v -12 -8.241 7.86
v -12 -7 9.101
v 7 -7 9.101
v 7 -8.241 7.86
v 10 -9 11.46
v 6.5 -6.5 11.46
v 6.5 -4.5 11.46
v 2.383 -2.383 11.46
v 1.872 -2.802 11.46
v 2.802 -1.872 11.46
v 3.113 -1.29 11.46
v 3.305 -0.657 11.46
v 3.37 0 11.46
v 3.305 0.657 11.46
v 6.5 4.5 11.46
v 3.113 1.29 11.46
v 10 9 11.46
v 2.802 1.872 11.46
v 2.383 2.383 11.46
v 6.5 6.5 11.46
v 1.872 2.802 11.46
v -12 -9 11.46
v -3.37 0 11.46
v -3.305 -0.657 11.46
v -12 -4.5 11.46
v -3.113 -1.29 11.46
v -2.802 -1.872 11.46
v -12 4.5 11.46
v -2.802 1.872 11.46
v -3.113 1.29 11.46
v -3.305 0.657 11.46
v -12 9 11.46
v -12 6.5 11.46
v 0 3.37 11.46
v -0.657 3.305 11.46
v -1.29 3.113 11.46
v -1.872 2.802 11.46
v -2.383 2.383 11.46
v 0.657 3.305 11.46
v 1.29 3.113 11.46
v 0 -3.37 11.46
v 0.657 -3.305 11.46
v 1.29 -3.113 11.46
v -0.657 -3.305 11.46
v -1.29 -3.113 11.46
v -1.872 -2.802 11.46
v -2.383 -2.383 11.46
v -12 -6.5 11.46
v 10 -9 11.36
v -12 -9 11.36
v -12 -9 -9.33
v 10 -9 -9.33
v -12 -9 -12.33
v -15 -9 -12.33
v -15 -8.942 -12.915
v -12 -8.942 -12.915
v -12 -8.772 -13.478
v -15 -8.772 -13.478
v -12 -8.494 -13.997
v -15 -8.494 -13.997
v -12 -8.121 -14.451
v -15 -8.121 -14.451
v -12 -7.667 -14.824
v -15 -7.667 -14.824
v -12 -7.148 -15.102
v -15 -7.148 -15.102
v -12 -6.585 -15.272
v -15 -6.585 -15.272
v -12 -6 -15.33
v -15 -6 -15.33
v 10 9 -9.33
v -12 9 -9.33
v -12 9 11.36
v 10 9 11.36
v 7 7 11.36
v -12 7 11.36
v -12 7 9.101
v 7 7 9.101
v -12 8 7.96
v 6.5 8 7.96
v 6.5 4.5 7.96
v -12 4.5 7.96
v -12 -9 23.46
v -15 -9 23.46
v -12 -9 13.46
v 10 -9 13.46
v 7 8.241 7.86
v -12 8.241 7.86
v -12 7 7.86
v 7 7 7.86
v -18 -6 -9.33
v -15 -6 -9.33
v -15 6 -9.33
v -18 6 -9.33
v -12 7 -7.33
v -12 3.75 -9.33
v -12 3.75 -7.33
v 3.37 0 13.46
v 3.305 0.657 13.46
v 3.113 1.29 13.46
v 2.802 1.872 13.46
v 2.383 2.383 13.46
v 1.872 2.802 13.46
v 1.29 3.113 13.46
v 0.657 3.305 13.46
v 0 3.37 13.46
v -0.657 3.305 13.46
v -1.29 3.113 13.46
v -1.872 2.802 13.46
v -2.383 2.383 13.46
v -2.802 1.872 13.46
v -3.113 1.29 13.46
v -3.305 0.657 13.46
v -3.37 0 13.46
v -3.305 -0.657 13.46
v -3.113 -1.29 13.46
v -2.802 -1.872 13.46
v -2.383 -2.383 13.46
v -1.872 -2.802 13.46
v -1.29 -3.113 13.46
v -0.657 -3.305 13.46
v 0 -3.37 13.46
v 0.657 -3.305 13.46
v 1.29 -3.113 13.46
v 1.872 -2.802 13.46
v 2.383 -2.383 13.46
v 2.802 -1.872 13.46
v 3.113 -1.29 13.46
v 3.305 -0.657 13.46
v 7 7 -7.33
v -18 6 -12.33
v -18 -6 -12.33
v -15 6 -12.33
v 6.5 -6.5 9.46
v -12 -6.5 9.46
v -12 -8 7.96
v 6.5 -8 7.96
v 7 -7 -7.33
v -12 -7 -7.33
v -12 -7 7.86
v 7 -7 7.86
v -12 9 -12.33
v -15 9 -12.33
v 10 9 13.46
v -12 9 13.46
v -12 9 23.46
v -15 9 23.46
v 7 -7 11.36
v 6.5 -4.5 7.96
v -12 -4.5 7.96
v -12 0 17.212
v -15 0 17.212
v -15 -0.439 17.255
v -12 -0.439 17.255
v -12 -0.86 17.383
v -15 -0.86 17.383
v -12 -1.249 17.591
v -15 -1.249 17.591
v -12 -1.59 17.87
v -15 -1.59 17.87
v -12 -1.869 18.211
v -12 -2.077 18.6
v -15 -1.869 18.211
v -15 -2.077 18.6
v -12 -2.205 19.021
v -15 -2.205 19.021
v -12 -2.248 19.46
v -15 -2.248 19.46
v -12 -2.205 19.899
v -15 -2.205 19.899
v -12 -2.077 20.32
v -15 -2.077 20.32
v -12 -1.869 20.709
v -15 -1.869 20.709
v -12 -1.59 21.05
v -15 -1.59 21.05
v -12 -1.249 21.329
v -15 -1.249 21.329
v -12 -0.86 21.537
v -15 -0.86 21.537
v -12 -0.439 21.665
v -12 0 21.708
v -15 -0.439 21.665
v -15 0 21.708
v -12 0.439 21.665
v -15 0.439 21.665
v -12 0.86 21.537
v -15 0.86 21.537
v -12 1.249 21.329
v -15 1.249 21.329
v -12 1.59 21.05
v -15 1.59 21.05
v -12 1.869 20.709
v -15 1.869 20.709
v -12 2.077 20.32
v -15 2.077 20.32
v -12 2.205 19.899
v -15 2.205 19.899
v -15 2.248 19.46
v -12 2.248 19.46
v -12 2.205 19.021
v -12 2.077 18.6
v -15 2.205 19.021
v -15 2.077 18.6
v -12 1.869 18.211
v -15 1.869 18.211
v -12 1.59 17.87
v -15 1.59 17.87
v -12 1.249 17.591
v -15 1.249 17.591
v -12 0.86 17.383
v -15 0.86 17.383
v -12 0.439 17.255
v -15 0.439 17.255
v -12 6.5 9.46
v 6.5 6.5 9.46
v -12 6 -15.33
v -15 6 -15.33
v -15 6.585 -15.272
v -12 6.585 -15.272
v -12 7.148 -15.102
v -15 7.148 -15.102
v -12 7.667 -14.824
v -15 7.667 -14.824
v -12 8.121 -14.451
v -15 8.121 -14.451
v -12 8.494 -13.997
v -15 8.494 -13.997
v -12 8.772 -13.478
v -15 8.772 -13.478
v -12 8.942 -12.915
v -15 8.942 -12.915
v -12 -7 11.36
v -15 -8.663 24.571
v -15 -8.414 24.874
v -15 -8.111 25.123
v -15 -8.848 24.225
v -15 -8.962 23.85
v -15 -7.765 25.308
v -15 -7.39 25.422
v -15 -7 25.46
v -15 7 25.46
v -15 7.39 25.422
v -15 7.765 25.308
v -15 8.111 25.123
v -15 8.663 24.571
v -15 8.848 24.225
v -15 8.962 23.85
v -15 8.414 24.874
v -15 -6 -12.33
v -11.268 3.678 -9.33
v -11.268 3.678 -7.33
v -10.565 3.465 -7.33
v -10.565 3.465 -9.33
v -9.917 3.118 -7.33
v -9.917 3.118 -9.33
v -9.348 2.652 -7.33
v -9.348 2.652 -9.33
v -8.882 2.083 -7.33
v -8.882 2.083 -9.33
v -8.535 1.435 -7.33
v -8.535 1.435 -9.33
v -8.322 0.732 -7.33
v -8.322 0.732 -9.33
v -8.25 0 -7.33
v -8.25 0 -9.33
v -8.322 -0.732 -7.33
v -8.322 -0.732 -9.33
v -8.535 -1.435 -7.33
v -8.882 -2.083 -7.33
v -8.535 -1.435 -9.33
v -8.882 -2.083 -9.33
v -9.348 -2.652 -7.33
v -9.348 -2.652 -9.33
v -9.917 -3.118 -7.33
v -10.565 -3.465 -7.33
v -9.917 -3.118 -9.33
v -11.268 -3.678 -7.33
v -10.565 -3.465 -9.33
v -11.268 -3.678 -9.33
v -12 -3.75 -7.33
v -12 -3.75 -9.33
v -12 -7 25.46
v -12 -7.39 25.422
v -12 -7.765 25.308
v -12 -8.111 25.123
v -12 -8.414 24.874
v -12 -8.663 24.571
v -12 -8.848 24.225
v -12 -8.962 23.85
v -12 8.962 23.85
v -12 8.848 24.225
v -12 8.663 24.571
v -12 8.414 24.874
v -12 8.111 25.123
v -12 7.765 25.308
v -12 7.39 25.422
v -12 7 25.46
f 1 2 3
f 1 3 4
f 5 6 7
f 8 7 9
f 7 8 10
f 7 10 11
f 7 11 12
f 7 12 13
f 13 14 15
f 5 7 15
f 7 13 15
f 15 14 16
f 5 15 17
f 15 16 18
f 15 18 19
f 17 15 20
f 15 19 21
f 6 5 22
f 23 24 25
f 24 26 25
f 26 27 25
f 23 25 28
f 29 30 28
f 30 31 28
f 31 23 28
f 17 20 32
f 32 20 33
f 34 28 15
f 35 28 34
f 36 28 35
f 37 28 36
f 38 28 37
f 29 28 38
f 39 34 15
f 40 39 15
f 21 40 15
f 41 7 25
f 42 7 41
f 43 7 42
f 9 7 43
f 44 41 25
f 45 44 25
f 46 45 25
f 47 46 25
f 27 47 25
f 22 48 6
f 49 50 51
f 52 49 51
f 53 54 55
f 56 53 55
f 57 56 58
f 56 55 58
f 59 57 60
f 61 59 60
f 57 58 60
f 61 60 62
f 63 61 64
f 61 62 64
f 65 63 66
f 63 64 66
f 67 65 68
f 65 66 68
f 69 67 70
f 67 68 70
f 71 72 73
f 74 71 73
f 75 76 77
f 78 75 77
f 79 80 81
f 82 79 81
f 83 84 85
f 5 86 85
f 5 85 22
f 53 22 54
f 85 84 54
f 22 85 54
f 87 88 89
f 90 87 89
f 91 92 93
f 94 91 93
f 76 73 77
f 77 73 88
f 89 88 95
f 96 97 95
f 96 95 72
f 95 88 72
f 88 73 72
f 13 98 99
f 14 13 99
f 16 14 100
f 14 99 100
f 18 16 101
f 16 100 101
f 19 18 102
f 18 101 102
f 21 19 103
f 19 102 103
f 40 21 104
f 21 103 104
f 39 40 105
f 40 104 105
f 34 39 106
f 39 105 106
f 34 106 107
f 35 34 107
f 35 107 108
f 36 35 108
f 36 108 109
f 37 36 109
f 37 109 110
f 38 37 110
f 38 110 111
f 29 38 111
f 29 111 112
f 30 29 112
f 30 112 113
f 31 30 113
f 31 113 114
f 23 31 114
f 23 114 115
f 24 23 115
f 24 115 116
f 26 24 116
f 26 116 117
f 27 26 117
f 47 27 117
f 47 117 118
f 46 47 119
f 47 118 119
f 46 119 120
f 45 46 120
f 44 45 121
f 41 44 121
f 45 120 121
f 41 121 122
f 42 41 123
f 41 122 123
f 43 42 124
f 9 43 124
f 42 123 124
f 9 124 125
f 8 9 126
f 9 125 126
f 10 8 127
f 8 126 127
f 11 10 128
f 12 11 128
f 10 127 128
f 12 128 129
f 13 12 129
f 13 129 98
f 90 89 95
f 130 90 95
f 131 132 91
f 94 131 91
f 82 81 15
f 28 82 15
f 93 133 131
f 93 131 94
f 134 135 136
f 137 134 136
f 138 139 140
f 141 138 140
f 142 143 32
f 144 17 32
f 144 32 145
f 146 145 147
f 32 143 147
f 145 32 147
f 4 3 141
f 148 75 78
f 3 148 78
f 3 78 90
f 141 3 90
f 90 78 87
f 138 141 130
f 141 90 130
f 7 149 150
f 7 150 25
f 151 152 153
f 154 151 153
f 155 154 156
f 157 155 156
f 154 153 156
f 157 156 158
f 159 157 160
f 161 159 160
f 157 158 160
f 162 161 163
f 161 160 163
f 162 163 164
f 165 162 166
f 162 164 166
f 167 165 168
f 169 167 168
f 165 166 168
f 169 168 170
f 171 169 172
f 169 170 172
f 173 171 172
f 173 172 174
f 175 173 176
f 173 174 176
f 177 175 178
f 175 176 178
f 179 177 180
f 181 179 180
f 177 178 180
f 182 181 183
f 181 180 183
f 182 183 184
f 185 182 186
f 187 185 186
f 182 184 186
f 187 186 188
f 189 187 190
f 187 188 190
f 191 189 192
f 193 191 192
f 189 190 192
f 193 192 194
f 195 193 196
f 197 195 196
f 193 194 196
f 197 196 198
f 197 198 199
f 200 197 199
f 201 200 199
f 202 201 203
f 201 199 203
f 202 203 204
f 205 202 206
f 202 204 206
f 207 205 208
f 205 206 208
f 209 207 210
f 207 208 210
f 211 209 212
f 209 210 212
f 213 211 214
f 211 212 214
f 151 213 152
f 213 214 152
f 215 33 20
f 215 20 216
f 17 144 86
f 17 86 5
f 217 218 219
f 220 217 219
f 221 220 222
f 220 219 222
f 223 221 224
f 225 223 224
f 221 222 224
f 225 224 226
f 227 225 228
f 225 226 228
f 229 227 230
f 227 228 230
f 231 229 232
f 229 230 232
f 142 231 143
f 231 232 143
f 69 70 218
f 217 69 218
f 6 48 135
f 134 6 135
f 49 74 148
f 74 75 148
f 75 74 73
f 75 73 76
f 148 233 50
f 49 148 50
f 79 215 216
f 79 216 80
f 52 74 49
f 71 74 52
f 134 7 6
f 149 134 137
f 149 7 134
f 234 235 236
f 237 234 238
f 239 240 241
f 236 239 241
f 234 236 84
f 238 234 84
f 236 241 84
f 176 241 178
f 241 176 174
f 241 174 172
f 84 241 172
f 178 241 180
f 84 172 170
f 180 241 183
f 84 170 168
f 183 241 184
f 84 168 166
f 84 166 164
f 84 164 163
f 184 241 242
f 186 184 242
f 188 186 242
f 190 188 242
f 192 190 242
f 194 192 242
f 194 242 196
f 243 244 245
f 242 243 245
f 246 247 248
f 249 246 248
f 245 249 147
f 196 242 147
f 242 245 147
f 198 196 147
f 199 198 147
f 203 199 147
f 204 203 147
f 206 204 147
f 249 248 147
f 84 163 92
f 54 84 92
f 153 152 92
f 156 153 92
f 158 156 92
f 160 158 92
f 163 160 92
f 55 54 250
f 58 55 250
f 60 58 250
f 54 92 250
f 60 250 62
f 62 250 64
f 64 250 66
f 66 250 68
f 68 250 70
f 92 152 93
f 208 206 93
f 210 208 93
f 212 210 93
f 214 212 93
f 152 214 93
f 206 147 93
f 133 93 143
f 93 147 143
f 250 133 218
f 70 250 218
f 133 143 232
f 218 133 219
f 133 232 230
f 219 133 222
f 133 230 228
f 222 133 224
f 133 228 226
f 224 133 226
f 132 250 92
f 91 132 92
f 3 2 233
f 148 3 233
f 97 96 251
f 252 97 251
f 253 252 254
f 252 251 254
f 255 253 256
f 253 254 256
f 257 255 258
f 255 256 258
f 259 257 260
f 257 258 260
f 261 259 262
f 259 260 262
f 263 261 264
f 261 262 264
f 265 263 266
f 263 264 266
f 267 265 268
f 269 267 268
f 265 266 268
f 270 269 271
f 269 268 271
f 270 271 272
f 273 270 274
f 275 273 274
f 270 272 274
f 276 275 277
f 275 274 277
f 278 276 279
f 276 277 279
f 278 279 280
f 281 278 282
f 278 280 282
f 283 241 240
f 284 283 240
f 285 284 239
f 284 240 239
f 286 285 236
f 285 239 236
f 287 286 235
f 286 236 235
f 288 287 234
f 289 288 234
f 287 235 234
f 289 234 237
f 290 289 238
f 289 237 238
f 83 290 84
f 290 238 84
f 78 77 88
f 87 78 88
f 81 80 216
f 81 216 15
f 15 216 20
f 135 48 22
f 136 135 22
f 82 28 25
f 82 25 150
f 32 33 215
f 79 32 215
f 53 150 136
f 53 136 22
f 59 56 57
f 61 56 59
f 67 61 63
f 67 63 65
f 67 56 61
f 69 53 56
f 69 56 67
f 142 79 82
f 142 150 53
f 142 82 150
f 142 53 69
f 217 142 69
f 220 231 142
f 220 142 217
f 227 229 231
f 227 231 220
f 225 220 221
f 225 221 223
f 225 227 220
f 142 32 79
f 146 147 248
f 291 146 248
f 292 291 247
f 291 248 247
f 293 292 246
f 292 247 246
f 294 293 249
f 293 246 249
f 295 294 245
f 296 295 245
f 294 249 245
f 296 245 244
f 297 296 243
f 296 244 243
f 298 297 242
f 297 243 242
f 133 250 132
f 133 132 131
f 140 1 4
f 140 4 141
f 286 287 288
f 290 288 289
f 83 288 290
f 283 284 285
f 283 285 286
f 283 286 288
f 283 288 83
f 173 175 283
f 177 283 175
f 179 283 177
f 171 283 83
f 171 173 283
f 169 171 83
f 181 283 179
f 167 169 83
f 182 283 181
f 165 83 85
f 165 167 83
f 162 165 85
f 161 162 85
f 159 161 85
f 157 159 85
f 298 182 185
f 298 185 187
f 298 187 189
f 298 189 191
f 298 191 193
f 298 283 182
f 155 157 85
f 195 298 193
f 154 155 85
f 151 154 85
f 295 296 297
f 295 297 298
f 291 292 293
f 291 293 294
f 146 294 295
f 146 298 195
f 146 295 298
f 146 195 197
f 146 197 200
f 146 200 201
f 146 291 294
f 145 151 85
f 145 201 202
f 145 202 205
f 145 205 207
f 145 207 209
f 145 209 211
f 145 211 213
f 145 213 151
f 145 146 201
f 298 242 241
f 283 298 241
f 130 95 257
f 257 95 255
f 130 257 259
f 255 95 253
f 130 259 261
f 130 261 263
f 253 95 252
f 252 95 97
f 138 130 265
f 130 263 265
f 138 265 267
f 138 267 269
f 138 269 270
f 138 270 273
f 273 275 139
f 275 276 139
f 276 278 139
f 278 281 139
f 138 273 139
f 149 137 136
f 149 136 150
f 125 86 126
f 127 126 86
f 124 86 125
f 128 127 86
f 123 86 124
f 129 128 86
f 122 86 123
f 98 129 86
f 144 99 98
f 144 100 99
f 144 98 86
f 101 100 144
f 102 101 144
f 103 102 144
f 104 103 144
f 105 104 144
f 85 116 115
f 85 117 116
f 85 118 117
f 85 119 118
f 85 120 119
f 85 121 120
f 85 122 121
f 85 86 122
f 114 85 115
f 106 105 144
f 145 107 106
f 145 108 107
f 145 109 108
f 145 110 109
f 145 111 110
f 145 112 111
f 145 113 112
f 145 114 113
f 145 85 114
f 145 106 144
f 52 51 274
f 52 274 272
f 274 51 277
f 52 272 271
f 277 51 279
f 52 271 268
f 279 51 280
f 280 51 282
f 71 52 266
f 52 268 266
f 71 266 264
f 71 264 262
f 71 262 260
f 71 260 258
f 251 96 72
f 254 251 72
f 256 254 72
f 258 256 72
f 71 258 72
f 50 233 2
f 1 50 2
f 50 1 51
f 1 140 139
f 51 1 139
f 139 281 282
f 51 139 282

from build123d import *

# Parameters (mm, degrees)
BOSS_EXTRUDE1_DEPTH      = 10
BOSS_EXTRUDE1_DEPTH_BACK = 15
SKETCH1_W                = 2
SKETCH1_H                = 18
SKETCH2_W                = 3
SKETCH2_H                = 18
BOSS_EXTRUDE2_DEPTH      = 20.79
BOSS_EXTRUDE3_DEPTH      = 22
SKETCH6_W                = 20.69
SKETCH6_H                = 18
BOSS_EXTRUDE4_DEPTH      = 3
CUT_EXTRUDE1_DEPTH       = 19
BOSS_EXTRUDE5_DEPTH      = 18.5
SKETCH7_R                = 3.75
CUT_EXTRUDE2_DEPTH       = 29.729498777
SKETCH8_R                = 3.37
CUT_EXTRUDE3_DEPTH       = 29.729498777
BOSS_EXTRUDE6_DEPTH      = 3
SKETCH13_W               = 3
SKETCH13_H               = 12
BOSS_EXTRUDE7_DEPTH      = 3
BOSS_EXTRUDE8_DEPTH      = 3
SKETCH17_W               = 2.2479
SKETCH17_H               = 6


with BuildPart() as part:
    # Sketch1 → Boss-Extrude1 (new, two sides: drawn at the far end of the back side and taken through both)
    with BuildSketch(Plane(origin=(0, 0, 0), x_dir=(0, 0, -1), z_dir=(1, 0, 0)).offset(-BOSS_EXTRUDE1_DEPTH_BACK)):
        with Locations((-12.46, 0)):
            Rectangle(SKETCH1_W, SKETCH1_H)
    extrude(amount=BOSS_EXTRUDE1_DEPTH + BOSS_EXTRUDE1_DEPTH_BACK)

    # Sketch2 → Boss-Extrude2 (add)
    with BuildSketch(Plane(origin=(0, 0, 11.46), x_dir=(-1, 0, 0), z_dir=(0, 0, -1))):
        with Locations((13.5, 0)):
            Rectangle(SKETCH2_W, SKETCH2_H)
    extrude(amount=BOSS_EXTRUDE2_DEPTH)

    # Sketch4 → Boss-Extrude5 (add)
    with BuildSketch(Plane(origin=(-12, 0, 0), x_dir=(0, 0, -1), z_dir=(1, 0, 0))):
        Polygon((-11.46, 6.5), (-9.46, 6.5), (-7.96, 8), (-7.96, 4.5), (-11.46, 4.5), align=None)
        Polygon((-7.96, -4.5), (-11.46, -4.5), (-11.46, -6.5), (-9.46, -6.5), (-7.96, -8), align=None)
    extrude(amount=BOSS_EXTRUDE5_DEPTH)

    # Sketch8 → Cut-Extrude3 (cut, through all)
    with BuildSketch(Plane.XY.offset(13.46)):
        Circle(SKETCH8_R)
    extrude(amount=-CUT_EXTRUDE3_DEPTH, mode=Mode.SUBTRACT)

    # Sketch9 → Boss-Extrude6 (add)
    with BuildSketch(Plane.ZY.offset(15)):
        with BuildLine():
            Line((-9.33, -9), (-12.33, -9))
            ThreePointArc((-12.33, -9), (-14.451320344, -8.121320344), (-15.33, -6))
            Line((-15.33, -6), (-15.33, 6))
            ThreePointArc((-15.33, 6), (-14.451320344, 8.121320344), (-12.33, 9))
            Line((-12.33, 9), (-9.33, 9))
            Line((-9.33, 9), (-9.33, -9))
        make_face()
    extrude(amount=-BOSS_EXTRUDE6_DEPTH)

    # Sketch13 → Boss-Extrude7 (add)
    with BuildSketch(Plane.ZY.offset(15)):
        with Locations((-10.83, 0)):
            Rectangle(SKETCH13_W, SKETCH13_H)
    extrude(amount=BOSS_EXTRUDE7_DEPTH)

    # Sketch14 → Boss-Extrude8 (add)
    with BuildSketch(Plane.ZY.offset(15)):
        with BuildLine():
            Line((13.46, -9), (13.46, 9))
            Line((13.46, 9), (23.46, 9))
            ThreePointArc((23.46, 9), (24.874213562, 8.414213562), (25.46, 7))
            Line((25.46, 7), (25.46, -7))
            ThreePointArc((25.46, -7), (24.874213562, -8.414213562), (23.46, -9))
            Line((23.46, -9), (13.46, -9))
        make_face()
    extrude(amount=-BOSS_EXTRUDE8_DEPTH)

    # Sketch17 → #8 Clearance Hole1 (revolve, cut)
    with BuildSketch(Plane(origin=(-12, 0, 19.46), x_dir=(0, 0, -1), z_dir=(0, 1, 0))):
        with Locations((1.12395, 3)):
            Rectangle(SKETCH17_W, SKETCH17_H)
    revolve(axis=Axis((-5.65, 0, 19.46), (-1, 0, 0)), mode=Mode.SUBTRACT)


with BuildPart() as body_2:
    # Sketch3 → Boss-Extrude3 (new body)
    with BuildSketch(Plane(origin=(-12, 0, 0), x_dir=(0, 0, -1), z_dir=(1, 0, 0))):
        Polygon((-11.36, 9), (-11.36, 7), (7.33, 7), (7.33, -7), (-11.36, -7), (-11.36, -9), (9.33, -9), (9.33, 9), align=None)
    extrude(amount=BOSS_EXTRUDE3_DEPTH)

    # Sketch6 → Boss-Extrude4 (add)
    with BuildSketch(Plane(origin=(10, 0, 0), x_dir=(0, 0, -1), z_dir=(1, 0, 0))):
        with Locations((-1.015, 0)):
            Rectangle(SKETCH6_W, SKETCH6_H)
    extrude(amount=-BOSS_EXTRUDE4_DEPTH)

    # Sketch5 → Cut-Extrude1 (cut)
    with BuildSketch(Plane(origin=(-12, 0, 0), x_dir=(0, 0, -1), z_dir=(1, 0, 0))):
        Polygon((-9.101421356, 7), (-7.86, 8.241421356), (-7.86, 7), align=None)
        Polygon((-7.86, -8.241421356), (-7.86, -7), (-9.101421356, -7), align=None)
    extrude(amount=CUT_EXTRUDE1_DEPTH, mode=Mode.SUBTRACT)

    # Sketch7 → Cut-Extrude2 (cut, through all)
    with BuildSketch(Plane(origin=(0, 0, -9.33), x_dir=(-1, 0, 0), z_dir=(0, 0, -1))):
        with Locations((12, 0)):
            Circle(SKETCH7_R)
    extrude(amount=-CUT_EXTRUDE2_DEPTH, mode=Mode.SUBTRACT)


solid = Compound([part.part, body_2.part])
